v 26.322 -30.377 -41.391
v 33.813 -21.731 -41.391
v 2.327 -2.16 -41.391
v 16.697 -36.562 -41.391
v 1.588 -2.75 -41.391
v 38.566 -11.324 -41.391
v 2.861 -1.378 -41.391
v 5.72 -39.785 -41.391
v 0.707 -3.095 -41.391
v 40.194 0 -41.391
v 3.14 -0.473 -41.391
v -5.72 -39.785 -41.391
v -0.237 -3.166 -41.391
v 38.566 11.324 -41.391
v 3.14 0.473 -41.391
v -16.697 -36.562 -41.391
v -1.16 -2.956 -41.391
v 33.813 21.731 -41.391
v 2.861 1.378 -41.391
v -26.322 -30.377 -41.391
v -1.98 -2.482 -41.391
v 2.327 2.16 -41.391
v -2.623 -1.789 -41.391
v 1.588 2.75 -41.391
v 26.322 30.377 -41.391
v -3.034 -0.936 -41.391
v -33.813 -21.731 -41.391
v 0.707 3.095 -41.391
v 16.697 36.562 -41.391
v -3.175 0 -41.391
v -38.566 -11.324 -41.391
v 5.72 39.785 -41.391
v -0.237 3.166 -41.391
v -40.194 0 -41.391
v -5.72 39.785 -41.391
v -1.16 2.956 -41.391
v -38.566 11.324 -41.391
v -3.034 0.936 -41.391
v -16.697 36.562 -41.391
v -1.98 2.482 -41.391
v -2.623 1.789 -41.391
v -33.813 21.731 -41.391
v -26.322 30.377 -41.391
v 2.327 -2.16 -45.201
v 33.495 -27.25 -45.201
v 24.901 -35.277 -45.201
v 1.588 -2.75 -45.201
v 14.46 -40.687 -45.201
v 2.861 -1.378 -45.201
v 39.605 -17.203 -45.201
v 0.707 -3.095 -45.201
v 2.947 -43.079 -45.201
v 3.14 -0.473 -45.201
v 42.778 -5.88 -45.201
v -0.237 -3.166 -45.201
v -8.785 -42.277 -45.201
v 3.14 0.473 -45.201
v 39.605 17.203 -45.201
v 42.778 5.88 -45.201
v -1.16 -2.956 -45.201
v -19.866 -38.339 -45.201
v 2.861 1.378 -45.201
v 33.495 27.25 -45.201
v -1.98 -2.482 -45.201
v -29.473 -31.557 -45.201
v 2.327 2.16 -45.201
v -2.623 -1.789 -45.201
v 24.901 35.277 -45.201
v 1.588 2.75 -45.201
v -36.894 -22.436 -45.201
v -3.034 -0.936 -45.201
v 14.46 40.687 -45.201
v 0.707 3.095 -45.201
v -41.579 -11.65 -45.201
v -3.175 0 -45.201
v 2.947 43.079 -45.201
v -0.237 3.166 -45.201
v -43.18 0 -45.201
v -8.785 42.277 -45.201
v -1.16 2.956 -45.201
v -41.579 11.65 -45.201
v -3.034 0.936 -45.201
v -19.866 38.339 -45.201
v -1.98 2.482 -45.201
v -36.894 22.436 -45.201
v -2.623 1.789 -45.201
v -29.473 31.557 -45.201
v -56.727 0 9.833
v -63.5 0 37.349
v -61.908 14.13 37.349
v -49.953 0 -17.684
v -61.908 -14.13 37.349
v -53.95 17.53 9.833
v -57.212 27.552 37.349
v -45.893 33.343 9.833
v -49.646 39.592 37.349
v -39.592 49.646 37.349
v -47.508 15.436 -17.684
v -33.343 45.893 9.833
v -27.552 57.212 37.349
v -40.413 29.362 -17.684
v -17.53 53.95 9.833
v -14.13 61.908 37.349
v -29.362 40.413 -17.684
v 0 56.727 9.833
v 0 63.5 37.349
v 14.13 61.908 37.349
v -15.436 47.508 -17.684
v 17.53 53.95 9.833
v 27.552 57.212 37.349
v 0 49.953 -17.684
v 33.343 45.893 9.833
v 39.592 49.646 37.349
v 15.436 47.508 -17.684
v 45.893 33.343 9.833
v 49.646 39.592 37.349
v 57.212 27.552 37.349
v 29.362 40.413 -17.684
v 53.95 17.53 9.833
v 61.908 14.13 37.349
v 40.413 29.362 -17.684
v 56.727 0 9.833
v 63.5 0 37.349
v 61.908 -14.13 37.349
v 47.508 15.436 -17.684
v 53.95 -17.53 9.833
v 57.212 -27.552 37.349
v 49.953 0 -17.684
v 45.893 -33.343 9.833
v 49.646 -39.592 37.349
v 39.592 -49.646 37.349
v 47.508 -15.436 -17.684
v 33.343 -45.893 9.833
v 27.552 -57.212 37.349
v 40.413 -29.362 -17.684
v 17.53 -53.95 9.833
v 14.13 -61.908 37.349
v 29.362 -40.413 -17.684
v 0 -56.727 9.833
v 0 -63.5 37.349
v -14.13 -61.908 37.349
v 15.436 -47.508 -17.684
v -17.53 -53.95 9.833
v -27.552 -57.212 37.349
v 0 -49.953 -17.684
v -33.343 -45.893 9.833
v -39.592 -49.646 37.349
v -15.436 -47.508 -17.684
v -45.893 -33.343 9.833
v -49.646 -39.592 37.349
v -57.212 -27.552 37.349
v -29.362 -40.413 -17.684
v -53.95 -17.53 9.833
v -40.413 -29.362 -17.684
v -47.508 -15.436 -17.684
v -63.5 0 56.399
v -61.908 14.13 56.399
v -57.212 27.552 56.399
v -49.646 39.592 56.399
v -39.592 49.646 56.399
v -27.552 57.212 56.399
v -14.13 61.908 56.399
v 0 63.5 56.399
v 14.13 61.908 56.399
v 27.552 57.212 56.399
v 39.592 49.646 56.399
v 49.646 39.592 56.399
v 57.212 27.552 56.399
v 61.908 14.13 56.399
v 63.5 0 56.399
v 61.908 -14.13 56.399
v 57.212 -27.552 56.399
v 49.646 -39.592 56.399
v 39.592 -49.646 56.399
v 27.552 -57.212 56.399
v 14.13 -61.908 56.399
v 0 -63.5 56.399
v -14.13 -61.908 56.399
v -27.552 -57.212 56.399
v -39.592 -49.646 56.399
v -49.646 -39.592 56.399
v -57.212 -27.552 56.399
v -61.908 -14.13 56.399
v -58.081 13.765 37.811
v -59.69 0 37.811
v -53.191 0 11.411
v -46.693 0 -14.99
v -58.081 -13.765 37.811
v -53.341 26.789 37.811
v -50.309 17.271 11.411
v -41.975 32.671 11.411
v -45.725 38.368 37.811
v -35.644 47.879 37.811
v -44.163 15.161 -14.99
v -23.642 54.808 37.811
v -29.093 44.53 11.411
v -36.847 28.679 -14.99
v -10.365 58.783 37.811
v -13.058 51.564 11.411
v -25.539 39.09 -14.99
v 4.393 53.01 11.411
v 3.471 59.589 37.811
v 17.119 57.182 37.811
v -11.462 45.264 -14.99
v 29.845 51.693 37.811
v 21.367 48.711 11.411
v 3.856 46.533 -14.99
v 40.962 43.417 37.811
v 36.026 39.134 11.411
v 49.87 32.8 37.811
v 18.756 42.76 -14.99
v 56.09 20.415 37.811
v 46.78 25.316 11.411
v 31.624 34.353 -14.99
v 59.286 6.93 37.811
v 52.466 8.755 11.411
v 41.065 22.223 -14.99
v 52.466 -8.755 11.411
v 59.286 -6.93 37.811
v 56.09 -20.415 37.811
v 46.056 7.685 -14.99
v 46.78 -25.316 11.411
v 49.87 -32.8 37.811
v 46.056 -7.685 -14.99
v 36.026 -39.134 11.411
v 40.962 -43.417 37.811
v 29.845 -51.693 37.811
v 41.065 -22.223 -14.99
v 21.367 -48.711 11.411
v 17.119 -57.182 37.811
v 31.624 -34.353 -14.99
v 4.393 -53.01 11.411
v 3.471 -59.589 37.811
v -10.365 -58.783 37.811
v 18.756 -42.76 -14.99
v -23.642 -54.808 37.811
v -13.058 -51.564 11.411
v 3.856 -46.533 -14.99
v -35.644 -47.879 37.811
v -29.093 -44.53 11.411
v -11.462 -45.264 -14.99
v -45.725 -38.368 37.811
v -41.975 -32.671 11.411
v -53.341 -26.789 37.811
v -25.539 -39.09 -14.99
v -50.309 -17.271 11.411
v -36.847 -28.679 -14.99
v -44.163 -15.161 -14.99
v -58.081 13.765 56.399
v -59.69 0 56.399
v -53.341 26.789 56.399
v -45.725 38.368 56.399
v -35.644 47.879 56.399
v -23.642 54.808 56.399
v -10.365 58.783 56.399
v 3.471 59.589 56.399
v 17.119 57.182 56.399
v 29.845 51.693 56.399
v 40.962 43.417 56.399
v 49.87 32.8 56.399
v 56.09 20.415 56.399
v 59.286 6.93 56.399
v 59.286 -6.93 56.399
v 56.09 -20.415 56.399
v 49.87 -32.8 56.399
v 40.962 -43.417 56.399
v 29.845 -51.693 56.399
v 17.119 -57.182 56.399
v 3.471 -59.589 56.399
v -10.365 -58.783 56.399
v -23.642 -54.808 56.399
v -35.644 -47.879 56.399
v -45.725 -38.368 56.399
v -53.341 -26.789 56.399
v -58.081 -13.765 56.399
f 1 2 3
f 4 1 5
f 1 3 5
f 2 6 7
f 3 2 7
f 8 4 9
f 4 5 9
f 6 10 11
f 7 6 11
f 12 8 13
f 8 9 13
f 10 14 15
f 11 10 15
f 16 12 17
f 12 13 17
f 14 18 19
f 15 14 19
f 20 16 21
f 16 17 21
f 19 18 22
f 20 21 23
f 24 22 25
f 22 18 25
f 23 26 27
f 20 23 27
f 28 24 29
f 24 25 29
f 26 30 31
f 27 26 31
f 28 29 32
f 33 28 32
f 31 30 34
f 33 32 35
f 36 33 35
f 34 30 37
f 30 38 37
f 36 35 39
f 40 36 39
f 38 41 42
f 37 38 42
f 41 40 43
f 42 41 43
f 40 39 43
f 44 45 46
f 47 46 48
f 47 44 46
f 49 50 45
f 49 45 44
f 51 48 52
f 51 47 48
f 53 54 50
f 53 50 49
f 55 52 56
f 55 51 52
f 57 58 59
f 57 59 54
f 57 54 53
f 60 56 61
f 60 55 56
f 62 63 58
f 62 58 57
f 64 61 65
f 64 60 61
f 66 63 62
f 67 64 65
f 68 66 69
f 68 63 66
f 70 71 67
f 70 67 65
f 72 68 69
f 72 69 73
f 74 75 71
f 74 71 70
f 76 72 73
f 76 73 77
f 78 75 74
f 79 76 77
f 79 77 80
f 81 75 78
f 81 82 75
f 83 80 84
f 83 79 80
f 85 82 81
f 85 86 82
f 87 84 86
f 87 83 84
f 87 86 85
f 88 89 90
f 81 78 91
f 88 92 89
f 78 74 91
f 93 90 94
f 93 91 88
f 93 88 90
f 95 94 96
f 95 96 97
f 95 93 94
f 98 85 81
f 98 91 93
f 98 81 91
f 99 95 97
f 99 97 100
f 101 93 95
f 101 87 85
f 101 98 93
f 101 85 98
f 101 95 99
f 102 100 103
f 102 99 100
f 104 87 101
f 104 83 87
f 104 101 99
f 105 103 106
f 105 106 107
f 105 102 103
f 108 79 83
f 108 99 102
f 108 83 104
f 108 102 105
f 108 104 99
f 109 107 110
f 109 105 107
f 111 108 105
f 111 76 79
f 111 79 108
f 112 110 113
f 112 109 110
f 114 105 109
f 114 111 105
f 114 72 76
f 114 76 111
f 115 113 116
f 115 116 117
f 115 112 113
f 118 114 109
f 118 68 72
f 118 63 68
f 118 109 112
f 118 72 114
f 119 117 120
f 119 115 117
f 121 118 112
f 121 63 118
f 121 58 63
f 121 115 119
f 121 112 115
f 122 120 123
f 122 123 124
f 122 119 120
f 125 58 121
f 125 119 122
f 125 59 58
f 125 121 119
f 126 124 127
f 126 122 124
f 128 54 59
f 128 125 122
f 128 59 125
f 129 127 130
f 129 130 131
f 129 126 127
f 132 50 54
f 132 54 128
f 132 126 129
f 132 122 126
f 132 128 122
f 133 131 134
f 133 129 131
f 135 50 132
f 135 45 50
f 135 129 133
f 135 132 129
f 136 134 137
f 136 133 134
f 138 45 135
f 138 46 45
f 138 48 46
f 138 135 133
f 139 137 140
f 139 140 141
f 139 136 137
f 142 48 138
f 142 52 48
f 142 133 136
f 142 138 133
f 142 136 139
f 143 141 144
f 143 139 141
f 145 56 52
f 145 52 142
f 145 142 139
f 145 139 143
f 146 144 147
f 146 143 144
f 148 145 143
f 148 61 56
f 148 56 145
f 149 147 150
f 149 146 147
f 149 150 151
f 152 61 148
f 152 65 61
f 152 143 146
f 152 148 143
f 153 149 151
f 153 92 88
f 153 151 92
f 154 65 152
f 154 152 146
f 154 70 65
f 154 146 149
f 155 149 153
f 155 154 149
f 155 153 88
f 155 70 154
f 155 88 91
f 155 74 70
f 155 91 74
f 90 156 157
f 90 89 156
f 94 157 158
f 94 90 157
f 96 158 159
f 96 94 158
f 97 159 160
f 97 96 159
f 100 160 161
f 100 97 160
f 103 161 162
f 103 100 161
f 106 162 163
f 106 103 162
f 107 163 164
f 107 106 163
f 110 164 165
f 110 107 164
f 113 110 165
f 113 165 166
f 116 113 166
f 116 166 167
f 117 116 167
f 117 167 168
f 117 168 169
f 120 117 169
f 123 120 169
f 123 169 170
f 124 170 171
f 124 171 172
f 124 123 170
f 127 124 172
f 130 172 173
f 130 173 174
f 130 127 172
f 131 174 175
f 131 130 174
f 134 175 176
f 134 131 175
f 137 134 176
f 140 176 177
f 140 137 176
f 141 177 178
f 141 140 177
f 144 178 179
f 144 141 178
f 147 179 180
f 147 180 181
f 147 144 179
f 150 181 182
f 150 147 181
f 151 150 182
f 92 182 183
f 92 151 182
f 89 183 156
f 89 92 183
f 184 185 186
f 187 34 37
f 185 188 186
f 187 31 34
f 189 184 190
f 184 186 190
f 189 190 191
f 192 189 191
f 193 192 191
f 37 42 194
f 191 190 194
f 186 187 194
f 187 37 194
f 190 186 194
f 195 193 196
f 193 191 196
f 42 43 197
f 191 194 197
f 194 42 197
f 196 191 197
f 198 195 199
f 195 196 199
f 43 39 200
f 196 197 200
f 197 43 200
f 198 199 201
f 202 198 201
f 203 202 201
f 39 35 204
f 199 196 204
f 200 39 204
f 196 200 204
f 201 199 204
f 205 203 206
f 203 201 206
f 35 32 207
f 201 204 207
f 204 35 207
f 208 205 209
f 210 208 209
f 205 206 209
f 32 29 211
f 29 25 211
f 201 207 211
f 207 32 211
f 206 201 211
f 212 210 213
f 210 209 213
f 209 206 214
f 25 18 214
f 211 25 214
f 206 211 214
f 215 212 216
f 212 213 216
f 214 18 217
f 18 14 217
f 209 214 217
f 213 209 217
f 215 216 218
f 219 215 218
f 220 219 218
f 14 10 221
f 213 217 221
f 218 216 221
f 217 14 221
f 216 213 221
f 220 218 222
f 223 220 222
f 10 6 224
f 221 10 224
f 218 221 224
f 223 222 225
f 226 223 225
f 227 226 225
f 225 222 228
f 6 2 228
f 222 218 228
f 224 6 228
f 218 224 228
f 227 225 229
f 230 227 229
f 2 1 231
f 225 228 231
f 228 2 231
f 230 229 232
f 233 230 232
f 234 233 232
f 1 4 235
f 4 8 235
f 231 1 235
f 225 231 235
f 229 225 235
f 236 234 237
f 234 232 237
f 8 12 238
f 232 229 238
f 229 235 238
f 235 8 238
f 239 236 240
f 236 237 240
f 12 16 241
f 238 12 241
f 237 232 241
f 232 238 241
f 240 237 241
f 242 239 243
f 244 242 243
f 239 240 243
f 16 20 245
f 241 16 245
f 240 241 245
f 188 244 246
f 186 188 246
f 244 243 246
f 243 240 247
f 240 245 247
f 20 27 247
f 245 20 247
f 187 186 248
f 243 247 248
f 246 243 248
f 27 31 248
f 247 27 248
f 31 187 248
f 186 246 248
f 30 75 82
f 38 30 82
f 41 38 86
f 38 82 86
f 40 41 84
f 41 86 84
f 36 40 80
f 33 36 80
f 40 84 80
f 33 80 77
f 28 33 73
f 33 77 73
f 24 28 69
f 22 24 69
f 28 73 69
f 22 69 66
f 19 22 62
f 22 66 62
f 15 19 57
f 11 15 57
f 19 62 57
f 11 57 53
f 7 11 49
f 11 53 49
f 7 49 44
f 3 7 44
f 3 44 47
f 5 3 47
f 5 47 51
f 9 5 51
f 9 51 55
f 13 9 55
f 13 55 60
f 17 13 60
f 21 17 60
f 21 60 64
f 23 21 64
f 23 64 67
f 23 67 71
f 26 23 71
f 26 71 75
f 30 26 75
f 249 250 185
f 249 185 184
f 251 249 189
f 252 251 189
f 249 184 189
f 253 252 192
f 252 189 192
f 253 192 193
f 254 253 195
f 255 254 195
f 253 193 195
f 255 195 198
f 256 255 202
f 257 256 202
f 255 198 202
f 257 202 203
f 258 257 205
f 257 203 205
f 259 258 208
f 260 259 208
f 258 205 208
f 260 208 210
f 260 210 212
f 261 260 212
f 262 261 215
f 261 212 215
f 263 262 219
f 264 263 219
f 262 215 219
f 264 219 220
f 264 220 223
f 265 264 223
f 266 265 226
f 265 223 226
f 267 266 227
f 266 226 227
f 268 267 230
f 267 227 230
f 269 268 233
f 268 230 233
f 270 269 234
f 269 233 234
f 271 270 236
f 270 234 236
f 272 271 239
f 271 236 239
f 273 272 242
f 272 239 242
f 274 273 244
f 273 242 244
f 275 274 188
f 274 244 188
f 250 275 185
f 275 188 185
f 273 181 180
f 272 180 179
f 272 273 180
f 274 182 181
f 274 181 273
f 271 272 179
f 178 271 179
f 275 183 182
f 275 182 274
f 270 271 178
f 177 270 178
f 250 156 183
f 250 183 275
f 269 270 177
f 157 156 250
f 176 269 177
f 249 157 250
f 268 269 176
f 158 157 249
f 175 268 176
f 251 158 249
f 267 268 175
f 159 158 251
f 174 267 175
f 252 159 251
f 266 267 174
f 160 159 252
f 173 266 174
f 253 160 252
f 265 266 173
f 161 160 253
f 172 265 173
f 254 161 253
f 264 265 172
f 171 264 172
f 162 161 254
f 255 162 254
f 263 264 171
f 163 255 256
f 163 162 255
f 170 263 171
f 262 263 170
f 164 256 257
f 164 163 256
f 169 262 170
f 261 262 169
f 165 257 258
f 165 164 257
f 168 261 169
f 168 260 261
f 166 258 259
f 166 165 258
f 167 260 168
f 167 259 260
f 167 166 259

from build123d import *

# Parameters (mm, degrees)
F2_T = -3.81
F4_D = 6.35


with BuildPart() as f1:
    # F0 (on Front) → F1 (revolve)
    with BuildSketch(Plane.XZ):
        Polygon((0, -45.200619), (0, 56.399381), (-63.5, 56.399381), (-63.5, 37.349381), (-43.18, -45.200619), align=None)
    revolve(axis=Axis((0, 0, 6.864863), (0, 0, -1)))

    # F2
    f2_openings = [f1.faces().sort_by_distance(p)[0] for p in [
        (0, 0, 56.399381),
    ]]
    offset(amount=F2_T, openings=f2_openings)

    # F4 (through all)
    with Locations(Plane.XY.offset(-41.390619)):
        with Locations((0, 0)):
            Hole(F4_D / 2)


solid = f1.part
